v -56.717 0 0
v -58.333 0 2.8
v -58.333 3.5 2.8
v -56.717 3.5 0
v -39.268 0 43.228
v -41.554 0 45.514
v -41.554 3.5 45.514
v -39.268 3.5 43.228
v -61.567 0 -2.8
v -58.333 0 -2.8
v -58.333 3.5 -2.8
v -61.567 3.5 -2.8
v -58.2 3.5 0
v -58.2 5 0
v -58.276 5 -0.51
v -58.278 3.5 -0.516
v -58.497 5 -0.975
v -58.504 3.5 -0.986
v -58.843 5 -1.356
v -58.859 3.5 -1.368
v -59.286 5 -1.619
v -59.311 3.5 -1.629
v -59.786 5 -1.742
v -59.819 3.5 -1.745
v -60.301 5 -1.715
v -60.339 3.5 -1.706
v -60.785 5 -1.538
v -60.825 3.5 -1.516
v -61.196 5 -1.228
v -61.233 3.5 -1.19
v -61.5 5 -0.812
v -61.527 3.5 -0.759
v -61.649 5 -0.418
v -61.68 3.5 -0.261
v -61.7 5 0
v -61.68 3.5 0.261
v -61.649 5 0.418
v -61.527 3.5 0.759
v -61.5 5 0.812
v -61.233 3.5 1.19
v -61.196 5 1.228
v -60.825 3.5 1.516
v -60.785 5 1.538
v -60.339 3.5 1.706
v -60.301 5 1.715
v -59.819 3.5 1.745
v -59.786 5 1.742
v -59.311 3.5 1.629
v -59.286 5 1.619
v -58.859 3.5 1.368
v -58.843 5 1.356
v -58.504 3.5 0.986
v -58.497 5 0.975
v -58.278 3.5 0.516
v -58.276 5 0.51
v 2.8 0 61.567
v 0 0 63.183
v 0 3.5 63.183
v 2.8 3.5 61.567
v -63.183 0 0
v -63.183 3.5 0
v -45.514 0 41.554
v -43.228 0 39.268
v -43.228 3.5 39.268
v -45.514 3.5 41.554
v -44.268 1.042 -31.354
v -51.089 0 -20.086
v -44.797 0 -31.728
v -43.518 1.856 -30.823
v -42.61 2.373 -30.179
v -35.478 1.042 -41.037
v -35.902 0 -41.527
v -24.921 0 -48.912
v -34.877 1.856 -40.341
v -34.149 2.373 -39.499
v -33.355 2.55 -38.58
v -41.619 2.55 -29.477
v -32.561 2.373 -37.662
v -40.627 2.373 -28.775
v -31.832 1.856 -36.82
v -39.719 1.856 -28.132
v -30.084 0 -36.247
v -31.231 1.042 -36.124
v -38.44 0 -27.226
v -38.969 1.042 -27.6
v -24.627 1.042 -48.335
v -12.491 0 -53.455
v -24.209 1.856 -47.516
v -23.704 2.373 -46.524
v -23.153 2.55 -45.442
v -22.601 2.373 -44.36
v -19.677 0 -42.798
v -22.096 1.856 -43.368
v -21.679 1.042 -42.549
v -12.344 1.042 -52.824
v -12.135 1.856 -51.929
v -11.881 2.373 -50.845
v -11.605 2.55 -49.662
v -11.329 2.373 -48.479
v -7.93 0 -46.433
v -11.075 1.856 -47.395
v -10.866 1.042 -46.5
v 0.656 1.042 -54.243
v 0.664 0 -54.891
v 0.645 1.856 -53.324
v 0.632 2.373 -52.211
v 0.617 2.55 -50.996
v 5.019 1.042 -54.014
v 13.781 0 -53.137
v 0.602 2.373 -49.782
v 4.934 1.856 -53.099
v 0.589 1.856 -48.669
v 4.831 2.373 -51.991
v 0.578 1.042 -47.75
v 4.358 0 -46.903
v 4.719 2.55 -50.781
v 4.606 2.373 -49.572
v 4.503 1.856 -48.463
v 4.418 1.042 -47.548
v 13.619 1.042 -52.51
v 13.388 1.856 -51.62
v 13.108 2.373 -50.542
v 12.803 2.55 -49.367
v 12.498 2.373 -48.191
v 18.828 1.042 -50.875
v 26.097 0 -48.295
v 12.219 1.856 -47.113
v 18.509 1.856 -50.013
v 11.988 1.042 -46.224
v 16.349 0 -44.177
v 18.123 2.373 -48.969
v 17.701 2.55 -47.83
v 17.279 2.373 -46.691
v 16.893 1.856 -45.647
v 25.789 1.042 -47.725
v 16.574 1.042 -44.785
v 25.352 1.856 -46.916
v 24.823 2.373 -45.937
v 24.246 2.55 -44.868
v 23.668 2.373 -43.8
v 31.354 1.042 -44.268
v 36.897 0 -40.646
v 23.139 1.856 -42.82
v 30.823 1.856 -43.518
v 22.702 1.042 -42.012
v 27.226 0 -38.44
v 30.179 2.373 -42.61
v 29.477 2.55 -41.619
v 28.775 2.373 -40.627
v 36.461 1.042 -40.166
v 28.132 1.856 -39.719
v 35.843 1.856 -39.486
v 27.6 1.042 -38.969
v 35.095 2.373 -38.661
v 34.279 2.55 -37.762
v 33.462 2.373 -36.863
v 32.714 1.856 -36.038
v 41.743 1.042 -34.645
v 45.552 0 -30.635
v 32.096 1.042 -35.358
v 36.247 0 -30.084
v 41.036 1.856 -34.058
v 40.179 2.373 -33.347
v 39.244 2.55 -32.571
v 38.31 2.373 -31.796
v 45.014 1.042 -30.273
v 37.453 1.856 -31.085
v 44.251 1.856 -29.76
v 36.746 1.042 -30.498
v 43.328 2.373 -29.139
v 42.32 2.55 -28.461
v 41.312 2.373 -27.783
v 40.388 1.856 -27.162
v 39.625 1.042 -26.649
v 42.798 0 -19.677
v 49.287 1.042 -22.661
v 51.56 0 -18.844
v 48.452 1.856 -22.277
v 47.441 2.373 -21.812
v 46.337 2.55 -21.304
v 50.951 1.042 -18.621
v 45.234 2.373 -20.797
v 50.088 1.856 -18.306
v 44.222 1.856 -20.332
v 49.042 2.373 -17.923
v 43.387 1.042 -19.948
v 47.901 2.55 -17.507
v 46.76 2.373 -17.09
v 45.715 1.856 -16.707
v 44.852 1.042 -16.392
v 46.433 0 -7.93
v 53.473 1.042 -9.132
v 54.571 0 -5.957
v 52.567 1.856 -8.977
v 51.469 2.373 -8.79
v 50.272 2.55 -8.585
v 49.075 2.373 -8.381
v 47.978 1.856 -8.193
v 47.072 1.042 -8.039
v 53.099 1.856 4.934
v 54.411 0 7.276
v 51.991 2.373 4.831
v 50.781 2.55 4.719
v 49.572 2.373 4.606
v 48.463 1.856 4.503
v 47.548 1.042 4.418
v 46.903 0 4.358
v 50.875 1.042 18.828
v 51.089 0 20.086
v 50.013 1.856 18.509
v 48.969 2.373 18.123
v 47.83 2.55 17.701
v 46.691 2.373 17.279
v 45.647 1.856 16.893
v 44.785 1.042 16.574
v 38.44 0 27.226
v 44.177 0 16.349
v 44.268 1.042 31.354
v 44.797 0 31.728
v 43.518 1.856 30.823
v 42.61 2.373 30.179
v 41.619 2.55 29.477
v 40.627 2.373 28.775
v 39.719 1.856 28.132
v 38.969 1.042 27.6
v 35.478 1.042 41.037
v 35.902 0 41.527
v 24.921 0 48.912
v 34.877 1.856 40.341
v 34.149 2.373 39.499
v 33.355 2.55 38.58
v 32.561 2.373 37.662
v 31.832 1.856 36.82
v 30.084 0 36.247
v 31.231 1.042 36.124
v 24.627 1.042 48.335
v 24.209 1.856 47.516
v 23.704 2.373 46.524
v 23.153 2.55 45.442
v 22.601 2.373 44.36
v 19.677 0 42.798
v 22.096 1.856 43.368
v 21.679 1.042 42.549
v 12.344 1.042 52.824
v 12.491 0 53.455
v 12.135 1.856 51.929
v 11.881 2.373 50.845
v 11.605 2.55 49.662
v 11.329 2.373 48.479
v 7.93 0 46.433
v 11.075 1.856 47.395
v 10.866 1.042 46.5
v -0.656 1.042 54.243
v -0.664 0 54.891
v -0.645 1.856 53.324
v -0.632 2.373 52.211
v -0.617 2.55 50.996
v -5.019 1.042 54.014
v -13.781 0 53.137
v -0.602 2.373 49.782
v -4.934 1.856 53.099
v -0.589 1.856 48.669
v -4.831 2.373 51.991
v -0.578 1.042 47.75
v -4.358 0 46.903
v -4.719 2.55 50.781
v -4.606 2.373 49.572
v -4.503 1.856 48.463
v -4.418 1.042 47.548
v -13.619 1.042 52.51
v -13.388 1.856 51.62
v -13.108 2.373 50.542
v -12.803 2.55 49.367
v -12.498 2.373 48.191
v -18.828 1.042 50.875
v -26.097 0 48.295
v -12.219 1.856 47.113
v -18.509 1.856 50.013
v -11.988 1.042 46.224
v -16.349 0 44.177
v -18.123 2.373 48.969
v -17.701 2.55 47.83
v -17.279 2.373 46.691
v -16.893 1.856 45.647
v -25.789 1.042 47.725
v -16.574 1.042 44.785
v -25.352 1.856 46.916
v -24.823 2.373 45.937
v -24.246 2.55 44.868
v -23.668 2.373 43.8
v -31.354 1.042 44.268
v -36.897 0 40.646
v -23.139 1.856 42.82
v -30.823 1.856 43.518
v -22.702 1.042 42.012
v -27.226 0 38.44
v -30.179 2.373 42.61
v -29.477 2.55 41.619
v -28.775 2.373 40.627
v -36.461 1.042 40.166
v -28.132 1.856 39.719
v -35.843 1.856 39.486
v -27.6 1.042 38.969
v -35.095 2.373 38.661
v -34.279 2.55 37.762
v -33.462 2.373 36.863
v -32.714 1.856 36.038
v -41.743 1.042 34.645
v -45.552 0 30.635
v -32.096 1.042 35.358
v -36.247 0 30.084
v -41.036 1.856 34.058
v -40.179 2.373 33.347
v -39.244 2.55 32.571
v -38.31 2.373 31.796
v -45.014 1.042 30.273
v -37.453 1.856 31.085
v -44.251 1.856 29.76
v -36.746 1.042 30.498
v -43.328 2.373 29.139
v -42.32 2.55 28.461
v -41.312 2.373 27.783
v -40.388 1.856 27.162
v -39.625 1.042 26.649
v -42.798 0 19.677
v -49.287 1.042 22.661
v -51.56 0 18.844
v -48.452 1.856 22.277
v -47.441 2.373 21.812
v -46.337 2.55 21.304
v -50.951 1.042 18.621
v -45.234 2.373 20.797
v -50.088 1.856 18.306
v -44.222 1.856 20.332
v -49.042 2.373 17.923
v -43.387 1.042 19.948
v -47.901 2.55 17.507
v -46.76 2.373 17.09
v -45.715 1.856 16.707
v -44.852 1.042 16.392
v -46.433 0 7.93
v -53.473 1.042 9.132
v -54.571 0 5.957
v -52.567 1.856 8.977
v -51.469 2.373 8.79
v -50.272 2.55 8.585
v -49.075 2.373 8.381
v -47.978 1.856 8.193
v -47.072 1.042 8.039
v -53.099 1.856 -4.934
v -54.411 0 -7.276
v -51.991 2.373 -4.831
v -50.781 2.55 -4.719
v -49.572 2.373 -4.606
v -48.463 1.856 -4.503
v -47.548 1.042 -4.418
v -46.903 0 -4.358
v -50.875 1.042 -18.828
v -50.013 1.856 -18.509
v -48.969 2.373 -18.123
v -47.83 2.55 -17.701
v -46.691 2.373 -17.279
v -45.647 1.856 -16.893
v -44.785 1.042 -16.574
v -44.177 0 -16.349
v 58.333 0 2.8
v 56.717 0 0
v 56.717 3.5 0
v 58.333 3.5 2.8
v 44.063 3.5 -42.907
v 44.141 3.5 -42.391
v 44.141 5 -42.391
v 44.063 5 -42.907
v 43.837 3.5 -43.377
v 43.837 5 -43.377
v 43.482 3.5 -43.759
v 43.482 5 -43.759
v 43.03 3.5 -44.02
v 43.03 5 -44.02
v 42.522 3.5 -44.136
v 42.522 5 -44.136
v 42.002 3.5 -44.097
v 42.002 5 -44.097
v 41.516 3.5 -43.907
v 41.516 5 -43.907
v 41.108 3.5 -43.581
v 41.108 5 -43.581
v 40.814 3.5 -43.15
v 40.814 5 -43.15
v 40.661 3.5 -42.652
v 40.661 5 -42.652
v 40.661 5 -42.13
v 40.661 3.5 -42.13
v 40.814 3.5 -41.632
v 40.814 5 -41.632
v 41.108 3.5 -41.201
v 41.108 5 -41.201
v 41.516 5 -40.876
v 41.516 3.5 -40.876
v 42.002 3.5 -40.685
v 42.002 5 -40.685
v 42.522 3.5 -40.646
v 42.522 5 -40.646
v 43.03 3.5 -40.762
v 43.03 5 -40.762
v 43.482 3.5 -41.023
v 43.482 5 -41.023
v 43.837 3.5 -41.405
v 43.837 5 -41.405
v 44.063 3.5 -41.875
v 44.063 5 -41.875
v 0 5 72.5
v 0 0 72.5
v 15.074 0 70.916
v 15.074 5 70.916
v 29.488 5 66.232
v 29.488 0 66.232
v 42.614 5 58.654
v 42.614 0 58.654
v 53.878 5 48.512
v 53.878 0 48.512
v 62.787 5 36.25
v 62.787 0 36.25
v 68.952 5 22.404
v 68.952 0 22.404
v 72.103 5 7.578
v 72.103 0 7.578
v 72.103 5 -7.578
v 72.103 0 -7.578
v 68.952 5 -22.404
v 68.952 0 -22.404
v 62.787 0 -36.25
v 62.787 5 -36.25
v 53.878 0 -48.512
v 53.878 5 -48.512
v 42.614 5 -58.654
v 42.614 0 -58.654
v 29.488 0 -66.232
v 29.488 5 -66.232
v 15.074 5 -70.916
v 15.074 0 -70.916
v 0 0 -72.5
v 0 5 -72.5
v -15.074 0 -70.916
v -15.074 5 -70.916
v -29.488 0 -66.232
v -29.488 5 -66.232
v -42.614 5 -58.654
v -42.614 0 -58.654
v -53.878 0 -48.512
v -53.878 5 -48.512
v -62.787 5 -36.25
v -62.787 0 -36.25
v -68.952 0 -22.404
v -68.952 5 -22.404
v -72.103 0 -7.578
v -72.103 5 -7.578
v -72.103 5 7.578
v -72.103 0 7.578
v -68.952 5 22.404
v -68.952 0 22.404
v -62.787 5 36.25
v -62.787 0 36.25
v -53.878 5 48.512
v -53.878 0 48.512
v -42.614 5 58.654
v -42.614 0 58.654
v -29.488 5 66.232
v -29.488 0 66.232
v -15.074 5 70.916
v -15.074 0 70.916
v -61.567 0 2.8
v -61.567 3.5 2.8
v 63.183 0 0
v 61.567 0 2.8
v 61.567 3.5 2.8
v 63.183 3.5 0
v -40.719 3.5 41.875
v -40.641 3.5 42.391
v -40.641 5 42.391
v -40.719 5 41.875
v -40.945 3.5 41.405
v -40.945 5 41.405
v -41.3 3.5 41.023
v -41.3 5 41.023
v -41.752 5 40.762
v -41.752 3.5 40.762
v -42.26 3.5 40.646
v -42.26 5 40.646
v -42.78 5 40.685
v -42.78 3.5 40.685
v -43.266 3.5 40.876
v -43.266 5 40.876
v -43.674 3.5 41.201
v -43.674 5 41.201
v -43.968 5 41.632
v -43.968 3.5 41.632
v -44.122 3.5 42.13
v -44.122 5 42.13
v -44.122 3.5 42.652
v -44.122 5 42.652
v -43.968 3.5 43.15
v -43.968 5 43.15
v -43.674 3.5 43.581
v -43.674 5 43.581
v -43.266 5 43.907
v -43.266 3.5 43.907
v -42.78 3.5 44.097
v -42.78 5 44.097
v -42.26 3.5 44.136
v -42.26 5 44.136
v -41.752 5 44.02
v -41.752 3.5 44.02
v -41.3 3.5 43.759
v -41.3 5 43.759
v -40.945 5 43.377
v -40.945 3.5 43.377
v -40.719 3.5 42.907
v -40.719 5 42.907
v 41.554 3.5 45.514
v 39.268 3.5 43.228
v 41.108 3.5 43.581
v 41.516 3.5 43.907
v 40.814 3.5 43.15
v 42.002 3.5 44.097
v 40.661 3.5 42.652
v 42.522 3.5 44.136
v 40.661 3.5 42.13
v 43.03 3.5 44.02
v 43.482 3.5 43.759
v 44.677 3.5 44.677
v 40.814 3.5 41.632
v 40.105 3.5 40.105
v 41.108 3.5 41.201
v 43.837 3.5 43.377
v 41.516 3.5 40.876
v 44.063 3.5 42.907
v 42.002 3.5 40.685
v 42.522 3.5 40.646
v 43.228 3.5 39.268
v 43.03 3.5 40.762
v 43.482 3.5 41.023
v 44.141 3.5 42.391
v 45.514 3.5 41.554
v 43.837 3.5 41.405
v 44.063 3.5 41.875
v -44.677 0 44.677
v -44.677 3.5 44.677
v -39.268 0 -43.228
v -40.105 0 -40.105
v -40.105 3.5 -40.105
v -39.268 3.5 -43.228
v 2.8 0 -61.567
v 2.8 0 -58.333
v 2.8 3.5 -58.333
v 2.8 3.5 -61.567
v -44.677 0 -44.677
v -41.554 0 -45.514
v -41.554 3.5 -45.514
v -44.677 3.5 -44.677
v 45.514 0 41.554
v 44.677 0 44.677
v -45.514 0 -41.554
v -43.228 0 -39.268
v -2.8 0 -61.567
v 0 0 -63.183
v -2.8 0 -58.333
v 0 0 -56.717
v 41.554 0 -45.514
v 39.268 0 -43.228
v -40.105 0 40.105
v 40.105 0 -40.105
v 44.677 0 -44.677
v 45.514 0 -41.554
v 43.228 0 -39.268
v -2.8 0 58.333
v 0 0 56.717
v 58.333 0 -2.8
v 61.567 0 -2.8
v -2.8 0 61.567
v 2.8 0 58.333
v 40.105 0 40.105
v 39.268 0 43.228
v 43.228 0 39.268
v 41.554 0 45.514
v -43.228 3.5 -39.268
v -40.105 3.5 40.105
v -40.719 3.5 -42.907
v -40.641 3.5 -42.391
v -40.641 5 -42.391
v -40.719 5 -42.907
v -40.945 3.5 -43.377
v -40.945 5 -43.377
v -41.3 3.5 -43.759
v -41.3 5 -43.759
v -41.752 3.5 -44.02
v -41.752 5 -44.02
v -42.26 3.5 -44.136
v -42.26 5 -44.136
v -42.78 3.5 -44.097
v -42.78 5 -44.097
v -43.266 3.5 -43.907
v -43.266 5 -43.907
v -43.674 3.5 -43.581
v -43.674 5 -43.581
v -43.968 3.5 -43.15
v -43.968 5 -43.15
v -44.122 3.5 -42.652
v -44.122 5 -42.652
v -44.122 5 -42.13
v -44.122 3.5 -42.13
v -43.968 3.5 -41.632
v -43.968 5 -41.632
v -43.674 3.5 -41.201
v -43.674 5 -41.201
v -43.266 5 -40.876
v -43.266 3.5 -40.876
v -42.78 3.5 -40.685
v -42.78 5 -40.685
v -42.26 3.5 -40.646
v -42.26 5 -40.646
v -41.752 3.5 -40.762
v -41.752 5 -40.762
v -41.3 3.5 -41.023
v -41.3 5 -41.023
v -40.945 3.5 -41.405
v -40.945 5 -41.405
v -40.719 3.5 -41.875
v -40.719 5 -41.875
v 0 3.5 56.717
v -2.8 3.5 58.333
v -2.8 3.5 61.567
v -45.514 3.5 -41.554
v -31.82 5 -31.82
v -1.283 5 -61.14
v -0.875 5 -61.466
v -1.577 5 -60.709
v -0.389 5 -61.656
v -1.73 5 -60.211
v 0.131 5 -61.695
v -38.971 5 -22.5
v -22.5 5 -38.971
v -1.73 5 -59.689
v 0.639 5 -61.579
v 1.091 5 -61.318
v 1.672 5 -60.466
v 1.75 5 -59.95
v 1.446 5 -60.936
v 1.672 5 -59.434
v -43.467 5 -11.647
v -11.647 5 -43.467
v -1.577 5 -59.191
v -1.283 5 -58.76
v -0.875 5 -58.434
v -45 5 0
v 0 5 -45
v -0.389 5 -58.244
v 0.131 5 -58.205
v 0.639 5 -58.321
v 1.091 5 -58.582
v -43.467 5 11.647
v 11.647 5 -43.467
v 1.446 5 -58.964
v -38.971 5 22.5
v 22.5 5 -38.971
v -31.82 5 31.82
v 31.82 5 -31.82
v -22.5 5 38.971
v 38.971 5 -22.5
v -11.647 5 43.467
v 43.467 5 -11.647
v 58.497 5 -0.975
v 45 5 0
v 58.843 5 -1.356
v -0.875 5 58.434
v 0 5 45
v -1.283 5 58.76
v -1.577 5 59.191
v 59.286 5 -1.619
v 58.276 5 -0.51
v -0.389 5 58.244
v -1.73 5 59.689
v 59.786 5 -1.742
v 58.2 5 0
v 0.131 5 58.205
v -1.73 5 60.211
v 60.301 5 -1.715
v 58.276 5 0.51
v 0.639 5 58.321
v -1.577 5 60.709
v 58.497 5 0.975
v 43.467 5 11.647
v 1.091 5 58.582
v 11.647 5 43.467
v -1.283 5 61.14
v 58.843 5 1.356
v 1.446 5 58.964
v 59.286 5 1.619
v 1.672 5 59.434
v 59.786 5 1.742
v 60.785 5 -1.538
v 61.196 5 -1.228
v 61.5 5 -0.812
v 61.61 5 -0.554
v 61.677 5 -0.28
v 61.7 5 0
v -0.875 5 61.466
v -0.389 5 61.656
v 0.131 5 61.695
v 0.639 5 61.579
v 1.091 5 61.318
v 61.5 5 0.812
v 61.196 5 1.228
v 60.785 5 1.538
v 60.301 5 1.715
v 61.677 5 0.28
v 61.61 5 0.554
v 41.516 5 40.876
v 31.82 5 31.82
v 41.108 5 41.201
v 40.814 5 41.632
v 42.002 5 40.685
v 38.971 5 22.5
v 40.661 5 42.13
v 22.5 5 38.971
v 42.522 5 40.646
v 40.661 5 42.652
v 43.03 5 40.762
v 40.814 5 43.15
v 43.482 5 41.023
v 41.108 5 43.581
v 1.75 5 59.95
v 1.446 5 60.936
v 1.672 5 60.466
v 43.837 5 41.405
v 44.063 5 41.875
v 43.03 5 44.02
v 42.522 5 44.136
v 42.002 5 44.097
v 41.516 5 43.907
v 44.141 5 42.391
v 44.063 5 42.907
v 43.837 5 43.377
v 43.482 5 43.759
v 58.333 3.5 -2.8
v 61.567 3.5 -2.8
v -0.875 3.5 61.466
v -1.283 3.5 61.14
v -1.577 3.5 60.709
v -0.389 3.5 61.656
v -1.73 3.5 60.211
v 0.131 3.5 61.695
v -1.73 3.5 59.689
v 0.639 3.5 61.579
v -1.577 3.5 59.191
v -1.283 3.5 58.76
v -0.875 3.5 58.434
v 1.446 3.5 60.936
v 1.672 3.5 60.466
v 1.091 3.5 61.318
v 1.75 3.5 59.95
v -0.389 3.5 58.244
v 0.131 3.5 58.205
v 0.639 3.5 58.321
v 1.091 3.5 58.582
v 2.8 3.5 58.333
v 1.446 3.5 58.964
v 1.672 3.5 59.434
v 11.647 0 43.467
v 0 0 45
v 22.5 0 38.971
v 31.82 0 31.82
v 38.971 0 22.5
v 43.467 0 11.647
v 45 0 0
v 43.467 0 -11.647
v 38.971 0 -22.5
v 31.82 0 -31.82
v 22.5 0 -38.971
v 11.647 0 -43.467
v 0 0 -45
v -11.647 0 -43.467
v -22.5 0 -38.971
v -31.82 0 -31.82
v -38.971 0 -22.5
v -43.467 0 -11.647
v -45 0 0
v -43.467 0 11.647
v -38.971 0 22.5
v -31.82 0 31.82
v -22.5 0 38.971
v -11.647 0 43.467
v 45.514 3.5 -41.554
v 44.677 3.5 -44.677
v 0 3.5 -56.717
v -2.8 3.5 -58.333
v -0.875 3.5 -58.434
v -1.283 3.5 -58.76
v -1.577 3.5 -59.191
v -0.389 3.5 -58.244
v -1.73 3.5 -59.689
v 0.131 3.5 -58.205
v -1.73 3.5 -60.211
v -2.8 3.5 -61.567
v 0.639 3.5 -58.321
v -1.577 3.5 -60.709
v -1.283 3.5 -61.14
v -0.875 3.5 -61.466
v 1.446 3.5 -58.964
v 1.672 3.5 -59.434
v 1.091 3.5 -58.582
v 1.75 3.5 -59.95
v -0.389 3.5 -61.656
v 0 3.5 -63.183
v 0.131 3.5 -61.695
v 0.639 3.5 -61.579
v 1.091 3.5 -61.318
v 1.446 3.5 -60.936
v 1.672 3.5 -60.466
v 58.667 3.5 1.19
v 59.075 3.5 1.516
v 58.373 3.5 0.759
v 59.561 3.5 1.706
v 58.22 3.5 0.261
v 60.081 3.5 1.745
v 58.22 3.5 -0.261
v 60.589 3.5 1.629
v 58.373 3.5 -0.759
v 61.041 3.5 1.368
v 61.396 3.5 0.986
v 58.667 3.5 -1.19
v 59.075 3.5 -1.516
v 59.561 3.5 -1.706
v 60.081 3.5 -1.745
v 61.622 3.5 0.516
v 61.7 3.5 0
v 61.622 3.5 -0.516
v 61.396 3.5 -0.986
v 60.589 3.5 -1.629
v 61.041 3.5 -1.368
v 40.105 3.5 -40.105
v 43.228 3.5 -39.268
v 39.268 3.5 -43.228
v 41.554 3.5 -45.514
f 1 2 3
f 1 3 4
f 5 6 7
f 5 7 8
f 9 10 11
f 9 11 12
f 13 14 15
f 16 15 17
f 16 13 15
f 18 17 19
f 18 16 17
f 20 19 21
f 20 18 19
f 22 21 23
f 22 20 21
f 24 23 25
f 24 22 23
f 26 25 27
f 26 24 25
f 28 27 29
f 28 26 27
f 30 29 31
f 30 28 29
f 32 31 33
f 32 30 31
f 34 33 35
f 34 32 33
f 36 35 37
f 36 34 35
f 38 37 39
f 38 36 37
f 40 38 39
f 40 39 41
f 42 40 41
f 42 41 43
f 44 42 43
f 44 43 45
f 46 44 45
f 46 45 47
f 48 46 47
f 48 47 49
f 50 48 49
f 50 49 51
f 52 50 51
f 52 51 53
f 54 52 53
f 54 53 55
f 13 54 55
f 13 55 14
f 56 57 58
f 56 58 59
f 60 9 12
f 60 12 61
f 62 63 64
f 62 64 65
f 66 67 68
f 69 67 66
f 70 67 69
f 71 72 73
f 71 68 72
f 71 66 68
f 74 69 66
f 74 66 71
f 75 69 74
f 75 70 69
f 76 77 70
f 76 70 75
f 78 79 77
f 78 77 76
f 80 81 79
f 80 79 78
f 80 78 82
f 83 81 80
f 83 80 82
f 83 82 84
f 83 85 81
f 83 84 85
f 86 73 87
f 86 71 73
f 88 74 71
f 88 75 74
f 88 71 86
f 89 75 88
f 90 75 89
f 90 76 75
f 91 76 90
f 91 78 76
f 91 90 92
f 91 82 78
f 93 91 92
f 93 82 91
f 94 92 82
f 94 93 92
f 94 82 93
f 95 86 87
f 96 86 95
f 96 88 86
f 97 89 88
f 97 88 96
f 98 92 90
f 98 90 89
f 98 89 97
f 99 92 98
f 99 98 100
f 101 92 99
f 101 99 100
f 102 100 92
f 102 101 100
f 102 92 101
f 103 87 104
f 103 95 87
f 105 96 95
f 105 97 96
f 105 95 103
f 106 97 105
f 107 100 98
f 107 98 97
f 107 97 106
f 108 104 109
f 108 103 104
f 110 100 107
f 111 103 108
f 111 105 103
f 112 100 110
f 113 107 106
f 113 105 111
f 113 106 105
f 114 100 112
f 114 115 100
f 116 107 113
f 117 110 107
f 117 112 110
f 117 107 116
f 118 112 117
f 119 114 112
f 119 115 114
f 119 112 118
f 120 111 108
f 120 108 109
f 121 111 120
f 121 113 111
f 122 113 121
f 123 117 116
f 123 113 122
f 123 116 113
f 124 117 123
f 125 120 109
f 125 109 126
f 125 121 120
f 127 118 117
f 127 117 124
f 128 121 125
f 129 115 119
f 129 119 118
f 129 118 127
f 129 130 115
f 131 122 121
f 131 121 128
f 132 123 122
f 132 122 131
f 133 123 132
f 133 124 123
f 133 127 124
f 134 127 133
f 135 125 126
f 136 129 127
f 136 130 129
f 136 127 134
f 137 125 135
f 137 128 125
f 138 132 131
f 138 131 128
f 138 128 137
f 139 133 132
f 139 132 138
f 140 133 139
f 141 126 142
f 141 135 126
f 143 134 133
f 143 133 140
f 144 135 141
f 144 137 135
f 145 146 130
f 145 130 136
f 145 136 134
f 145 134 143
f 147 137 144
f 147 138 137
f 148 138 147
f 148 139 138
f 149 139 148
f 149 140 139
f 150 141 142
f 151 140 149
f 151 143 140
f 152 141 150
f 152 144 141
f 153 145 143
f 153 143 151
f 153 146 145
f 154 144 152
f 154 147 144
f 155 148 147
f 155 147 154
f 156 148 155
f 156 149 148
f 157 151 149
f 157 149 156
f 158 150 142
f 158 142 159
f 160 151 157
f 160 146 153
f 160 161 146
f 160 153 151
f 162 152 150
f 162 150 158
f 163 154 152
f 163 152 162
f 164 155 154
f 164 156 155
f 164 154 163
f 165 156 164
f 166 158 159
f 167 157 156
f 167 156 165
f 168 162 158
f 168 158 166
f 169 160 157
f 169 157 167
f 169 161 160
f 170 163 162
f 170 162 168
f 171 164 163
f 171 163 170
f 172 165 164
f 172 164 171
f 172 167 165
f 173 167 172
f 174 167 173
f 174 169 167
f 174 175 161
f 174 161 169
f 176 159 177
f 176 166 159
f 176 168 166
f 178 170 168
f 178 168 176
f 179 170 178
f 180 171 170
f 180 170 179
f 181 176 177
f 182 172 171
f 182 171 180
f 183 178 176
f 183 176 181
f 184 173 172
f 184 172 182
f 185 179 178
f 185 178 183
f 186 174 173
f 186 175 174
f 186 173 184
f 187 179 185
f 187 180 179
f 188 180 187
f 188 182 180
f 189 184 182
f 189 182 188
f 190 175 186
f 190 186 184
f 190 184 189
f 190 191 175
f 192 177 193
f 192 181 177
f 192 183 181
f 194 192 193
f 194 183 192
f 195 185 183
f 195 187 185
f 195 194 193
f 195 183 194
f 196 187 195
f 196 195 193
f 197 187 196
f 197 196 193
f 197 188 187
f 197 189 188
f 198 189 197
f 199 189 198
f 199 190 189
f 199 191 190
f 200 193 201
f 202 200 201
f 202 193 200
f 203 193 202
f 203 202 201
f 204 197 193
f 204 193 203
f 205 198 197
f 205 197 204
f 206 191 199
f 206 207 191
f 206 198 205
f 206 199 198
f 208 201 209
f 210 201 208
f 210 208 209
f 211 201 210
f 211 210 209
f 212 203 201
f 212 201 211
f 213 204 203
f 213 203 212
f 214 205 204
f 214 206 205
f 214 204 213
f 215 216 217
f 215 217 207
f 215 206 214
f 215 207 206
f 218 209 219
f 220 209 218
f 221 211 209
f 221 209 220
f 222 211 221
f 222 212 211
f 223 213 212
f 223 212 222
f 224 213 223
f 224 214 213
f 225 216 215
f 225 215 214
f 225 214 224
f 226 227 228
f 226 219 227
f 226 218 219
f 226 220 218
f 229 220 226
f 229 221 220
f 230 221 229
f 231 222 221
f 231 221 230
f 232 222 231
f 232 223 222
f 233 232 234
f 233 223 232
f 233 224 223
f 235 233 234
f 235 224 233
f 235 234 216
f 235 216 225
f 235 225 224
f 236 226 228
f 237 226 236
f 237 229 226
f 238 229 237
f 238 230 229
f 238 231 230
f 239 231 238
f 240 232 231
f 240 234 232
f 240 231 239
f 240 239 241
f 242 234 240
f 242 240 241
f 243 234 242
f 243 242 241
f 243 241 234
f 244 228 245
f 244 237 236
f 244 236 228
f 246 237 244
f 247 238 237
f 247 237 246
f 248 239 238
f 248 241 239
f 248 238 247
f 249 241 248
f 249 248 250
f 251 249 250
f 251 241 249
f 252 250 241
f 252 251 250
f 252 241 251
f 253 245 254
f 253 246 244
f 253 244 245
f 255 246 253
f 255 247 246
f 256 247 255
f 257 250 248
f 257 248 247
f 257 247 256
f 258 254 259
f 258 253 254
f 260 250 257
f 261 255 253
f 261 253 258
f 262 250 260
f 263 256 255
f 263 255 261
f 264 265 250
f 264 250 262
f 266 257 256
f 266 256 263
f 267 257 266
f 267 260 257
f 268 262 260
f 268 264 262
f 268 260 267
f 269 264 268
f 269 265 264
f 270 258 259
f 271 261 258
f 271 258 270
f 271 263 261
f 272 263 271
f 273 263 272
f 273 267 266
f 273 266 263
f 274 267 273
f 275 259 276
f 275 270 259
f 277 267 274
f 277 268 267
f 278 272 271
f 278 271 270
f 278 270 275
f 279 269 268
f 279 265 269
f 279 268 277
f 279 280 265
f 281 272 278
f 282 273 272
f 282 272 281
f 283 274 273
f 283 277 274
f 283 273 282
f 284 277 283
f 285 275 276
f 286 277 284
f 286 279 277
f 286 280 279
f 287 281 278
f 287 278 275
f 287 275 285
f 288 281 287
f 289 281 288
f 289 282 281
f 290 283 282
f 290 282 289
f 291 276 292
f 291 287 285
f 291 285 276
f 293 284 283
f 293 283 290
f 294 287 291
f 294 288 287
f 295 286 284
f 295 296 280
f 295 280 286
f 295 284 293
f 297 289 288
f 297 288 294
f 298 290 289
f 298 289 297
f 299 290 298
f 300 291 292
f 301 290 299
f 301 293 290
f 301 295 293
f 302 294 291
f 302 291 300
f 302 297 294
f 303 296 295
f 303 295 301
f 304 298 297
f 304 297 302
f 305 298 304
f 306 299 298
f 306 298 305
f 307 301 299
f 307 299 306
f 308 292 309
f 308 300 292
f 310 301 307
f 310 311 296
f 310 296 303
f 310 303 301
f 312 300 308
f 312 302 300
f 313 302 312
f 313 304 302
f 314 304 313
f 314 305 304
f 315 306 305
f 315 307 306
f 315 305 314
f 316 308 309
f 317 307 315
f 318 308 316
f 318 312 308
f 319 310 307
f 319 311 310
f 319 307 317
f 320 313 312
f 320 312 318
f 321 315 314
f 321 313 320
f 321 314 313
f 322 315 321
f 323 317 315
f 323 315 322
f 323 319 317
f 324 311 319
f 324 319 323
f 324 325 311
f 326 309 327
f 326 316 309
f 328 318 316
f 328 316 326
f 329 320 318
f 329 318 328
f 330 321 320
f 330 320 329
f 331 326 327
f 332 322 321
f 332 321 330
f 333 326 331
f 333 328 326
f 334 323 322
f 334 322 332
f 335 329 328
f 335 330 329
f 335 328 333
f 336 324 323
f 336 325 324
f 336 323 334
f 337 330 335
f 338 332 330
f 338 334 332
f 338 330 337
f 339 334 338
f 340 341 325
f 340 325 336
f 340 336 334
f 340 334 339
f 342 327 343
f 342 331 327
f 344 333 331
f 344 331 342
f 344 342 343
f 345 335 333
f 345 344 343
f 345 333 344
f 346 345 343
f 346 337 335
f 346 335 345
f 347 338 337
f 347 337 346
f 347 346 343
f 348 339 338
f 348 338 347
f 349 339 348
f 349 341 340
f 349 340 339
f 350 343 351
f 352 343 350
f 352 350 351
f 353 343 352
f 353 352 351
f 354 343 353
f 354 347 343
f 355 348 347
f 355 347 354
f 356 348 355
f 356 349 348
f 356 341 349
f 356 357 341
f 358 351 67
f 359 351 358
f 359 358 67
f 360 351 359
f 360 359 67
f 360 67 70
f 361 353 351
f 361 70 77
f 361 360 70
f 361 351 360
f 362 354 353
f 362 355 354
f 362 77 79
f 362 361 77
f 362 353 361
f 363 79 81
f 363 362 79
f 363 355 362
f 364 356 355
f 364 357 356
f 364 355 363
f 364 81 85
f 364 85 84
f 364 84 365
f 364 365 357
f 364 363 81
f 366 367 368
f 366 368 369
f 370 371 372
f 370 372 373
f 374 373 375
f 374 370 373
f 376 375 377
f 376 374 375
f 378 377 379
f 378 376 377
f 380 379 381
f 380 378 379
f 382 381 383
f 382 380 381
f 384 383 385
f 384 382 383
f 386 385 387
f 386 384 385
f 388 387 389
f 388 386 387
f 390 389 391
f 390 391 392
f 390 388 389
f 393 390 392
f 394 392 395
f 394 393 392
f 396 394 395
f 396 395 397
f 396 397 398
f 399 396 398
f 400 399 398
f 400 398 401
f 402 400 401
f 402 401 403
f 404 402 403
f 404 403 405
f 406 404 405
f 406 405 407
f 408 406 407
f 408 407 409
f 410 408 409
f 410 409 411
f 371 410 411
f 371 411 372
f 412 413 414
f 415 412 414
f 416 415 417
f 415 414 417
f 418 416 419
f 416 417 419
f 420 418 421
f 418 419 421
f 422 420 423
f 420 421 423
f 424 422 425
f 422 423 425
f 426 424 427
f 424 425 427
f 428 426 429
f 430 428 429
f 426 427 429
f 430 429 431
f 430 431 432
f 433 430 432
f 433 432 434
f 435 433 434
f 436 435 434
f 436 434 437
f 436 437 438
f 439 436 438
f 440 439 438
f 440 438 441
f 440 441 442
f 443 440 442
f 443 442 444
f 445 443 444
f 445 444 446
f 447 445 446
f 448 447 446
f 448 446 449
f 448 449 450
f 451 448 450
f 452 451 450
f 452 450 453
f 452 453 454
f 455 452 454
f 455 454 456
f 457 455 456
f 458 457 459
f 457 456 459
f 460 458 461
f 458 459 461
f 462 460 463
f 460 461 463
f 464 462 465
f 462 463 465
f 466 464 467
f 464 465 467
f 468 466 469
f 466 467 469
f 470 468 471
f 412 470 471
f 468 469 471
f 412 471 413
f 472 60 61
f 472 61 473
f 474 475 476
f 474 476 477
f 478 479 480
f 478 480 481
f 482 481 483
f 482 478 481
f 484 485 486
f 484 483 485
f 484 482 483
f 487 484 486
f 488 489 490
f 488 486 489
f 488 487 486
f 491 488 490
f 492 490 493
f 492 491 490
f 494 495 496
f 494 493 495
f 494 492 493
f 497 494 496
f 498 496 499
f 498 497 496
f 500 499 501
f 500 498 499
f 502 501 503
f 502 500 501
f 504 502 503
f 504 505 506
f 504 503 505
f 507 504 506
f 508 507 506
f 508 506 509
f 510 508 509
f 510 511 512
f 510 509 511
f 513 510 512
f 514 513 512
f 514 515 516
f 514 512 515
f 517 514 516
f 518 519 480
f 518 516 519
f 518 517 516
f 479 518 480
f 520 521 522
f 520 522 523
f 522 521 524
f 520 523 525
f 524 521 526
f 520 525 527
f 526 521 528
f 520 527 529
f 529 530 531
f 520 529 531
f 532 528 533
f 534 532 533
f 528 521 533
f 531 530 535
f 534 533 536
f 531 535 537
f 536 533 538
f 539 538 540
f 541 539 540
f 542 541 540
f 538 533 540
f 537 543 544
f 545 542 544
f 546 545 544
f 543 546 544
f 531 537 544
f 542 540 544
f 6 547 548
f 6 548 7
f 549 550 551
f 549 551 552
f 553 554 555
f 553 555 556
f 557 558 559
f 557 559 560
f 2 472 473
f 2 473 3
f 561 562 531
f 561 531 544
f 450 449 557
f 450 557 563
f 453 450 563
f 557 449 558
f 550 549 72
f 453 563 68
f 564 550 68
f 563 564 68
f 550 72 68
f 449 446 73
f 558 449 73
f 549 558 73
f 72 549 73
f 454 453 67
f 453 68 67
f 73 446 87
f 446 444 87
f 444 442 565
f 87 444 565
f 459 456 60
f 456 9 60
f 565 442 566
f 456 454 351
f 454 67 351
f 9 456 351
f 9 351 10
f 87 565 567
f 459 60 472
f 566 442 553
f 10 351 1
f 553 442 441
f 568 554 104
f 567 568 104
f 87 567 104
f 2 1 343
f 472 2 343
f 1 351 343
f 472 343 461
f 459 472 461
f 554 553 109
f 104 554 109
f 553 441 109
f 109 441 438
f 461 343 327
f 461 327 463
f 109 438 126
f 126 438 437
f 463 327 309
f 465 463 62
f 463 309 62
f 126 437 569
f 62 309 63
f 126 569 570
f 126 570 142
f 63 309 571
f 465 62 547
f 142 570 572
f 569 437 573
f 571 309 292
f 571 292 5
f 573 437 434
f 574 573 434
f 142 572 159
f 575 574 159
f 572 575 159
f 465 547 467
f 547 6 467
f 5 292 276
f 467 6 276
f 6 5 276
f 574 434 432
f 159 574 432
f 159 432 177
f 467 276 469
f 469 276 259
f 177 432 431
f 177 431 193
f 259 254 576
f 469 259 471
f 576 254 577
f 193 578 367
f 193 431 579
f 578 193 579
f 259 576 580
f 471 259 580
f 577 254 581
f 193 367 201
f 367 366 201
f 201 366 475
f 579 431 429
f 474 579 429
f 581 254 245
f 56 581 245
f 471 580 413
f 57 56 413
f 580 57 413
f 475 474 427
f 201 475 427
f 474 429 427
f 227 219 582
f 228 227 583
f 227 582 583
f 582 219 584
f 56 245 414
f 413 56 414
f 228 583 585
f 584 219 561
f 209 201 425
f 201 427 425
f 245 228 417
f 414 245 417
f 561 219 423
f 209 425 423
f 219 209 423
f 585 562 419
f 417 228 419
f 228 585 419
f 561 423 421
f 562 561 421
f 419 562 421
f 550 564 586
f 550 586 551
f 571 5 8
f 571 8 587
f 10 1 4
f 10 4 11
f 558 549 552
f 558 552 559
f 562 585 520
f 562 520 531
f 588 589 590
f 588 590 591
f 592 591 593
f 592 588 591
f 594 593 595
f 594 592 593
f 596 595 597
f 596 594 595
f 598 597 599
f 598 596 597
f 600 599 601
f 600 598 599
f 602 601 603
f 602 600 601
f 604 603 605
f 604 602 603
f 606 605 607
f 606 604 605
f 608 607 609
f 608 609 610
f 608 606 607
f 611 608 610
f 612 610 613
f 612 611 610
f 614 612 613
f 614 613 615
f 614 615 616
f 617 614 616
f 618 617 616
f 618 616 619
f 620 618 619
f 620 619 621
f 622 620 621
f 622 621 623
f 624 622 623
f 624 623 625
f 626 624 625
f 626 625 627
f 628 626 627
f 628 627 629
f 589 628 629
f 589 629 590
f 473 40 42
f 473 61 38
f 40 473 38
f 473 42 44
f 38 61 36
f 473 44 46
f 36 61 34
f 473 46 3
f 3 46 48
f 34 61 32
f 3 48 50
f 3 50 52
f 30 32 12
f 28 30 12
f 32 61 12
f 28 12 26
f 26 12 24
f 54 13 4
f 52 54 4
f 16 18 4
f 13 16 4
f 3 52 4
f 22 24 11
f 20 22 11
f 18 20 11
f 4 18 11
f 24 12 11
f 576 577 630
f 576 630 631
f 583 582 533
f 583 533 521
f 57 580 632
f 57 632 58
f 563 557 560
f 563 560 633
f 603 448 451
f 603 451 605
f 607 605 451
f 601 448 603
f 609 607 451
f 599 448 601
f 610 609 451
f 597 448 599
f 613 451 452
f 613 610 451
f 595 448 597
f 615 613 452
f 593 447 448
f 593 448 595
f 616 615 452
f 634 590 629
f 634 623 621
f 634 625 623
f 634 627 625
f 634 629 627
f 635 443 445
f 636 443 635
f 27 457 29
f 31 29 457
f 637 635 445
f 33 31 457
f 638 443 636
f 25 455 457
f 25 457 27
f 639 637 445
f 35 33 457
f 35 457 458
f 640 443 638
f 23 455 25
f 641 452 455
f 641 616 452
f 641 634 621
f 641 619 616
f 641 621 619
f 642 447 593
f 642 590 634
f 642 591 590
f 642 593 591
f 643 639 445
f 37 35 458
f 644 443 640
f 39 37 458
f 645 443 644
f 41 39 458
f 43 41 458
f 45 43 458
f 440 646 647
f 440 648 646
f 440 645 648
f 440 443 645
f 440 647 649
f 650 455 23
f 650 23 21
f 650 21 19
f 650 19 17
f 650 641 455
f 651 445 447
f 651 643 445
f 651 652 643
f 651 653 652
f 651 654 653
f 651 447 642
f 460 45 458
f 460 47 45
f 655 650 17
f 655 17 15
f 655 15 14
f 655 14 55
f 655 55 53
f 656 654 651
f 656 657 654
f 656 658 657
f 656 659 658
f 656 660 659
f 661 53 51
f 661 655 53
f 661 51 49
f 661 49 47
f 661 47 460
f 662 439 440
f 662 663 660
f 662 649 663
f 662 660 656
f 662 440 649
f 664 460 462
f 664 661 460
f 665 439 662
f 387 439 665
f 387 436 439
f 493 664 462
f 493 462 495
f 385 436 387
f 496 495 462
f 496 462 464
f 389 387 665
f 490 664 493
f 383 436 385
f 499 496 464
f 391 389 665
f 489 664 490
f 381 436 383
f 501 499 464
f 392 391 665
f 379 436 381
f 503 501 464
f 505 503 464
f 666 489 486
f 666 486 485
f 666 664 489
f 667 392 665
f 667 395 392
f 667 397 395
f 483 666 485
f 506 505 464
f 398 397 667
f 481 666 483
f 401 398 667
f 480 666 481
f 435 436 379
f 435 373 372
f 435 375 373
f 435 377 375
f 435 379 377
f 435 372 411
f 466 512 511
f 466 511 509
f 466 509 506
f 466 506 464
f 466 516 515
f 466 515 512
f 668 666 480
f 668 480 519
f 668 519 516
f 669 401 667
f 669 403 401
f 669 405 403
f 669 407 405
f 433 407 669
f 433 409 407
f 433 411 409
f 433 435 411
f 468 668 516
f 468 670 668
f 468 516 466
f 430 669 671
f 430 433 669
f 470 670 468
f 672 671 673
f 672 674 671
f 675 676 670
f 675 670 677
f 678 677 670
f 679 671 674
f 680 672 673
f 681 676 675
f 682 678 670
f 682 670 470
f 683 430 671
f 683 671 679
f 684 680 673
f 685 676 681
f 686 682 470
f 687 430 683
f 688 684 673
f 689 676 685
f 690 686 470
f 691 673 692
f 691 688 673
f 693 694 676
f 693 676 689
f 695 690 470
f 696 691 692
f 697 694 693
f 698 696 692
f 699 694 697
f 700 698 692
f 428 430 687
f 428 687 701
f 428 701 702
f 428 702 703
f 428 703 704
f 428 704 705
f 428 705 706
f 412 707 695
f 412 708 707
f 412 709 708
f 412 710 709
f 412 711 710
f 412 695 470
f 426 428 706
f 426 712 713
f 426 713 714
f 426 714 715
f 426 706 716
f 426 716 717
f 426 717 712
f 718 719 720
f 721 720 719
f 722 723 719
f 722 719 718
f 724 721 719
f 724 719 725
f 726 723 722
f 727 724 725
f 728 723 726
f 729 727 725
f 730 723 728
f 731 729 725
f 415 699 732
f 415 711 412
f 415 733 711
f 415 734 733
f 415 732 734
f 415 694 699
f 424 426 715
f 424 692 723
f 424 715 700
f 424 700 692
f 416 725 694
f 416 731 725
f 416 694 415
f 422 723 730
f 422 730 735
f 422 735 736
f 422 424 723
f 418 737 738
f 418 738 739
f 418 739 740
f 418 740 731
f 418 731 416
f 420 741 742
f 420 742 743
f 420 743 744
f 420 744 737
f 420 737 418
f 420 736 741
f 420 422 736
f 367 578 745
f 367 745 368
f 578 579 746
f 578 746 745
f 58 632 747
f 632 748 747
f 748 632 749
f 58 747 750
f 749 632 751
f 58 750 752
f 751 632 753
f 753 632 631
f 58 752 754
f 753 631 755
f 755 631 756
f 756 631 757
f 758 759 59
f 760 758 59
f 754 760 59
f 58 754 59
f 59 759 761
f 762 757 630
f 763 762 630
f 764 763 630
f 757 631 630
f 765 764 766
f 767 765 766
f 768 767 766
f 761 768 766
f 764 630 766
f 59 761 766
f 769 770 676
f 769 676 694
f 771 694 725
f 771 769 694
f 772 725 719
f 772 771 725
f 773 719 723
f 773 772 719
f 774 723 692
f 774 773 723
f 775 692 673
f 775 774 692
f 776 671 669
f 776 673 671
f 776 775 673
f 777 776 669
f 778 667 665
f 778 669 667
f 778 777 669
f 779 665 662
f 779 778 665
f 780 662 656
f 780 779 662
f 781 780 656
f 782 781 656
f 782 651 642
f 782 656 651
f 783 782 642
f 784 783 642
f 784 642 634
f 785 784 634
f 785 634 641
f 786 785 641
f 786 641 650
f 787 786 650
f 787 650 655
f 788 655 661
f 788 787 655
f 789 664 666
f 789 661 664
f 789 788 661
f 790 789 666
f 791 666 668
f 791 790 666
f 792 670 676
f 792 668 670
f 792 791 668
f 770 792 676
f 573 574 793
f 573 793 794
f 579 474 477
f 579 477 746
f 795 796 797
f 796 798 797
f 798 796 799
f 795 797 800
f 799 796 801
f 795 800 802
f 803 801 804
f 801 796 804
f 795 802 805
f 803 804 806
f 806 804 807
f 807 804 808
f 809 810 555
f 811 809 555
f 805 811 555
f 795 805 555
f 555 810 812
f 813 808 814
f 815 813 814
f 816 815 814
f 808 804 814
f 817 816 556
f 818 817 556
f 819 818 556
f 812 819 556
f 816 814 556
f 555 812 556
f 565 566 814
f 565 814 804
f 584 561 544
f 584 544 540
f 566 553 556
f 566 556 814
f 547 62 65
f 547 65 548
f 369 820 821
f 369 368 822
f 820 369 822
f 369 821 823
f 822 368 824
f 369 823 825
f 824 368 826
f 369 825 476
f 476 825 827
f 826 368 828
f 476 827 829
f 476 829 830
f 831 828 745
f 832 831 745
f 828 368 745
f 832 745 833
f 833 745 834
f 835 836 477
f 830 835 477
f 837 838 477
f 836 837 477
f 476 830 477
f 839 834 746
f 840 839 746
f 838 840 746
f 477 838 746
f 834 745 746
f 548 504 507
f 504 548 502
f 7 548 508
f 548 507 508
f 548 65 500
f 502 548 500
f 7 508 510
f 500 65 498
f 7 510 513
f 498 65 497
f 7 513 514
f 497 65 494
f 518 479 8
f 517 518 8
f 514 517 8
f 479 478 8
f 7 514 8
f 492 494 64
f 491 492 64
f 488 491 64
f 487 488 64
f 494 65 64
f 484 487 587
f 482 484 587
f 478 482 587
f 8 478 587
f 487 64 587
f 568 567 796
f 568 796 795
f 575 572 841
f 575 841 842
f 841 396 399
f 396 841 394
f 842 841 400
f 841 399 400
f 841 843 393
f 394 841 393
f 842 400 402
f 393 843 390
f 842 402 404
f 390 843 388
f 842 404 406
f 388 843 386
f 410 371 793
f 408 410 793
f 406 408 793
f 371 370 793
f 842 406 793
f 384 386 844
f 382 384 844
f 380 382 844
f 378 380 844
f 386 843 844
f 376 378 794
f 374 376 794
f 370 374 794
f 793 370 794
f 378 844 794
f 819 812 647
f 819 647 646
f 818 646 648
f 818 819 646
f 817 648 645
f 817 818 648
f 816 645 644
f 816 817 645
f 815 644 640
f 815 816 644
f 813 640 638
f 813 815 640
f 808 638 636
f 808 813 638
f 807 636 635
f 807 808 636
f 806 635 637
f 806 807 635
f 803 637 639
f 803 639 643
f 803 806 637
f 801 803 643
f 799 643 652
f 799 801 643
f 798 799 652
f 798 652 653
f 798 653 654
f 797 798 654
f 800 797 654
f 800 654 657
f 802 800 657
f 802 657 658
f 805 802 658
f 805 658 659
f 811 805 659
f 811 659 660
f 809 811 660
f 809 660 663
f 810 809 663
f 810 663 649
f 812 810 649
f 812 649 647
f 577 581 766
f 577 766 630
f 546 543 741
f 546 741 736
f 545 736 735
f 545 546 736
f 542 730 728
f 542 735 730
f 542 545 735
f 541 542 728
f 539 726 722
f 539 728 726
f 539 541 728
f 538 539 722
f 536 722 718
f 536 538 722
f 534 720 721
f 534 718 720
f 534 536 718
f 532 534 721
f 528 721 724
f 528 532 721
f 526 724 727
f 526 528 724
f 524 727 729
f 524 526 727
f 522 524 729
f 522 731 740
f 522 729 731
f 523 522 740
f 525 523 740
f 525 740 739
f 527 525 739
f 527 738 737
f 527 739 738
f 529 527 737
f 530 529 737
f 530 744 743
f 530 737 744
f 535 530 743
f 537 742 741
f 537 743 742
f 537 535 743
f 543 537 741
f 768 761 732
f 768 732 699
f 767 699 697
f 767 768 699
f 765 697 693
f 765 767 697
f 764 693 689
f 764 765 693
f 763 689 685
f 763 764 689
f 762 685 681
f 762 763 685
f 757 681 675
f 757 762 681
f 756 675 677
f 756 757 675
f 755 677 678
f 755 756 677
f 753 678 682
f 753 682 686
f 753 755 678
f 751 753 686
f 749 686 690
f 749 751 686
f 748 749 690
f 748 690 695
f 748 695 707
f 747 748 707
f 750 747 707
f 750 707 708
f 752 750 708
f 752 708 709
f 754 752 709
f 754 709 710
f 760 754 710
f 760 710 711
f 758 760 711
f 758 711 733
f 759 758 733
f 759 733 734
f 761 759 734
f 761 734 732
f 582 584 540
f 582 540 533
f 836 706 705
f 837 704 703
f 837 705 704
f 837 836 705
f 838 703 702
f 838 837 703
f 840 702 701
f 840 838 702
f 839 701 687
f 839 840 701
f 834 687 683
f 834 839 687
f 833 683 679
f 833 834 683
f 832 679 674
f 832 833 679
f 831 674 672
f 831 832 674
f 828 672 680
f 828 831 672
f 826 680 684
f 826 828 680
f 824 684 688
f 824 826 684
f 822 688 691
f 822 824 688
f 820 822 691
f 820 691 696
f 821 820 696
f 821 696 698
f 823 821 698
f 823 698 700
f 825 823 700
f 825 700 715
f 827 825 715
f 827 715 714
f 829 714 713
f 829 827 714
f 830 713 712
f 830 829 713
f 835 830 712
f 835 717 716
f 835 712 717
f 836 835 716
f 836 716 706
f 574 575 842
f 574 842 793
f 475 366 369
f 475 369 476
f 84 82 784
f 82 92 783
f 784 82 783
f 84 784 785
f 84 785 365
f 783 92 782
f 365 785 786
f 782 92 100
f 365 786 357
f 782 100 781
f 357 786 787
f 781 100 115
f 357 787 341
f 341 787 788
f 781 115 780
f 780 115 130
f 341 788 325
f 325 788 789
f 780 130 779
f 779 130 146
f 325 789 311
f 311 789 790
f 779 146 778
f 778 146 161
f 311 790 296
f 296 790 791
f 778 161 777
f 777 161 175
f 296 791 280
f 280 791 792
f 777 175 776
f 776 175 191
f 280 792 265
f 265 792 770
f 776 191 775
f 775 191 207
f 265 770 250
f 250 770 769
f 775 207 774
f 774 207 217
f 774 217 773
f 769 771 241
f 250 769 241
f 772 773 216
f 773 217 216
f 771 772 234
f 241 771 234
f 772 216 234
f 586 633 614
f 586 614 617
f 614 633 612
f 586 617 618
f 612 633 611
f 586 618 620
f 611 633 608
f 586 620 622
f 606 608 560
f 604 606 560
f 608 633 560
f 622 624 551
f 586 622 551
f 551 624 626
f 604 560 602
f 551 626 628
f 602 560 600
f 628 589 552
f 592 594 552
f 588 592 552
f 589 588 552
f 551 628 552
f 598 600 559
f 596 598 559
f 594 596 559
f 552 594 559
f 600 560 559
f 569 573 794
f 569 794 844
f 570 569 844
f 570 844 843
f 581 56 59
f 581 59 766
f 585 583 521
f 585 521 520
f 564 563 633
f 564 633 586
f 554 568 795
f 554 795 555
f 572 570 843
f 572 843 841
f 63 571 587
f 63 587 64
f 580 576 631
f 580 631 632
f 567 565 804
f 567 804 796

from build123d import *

# Parameters (mm, degrees)
SZKIC1_R                         = 72.5
DODANIE_WYCI_GNI_CIE1_DEPTH      = 5
DODANIE_WYCI_GNI_CIE2_START      = 5
SZKIC1_3_R                       = 65
SZKIC1_3_R_2                     = 54.5
DODANIE_WYCI_GNI_CIE2_DEPTH      = 8
DODANIE_WYCI_GNI_CIE3_START      = 13
SZKIC1_4_R                       = 54.5
DODANIE_WYCI_GNI_CIE3_DEPTH      = 30
DODANIE_WYCI_GNI_CIE4_START      = 43
SZKIC2_W                         = 34
SZKIC2_H                         = 88
DODANIE_WYCI_GNI_CIE4_DEPTH      = 93
SZKIC3_R                         = 45
WYTNIJ_WYCI_GNI_CIE1_DEPTH       = 10
DODANIE_WYCI_GNI_CIE5_START      = 10
SZKIC4_R                         = 3
DODANIE_WYCI_GNI_CIE5_DEPTH      = 13
ZAAWANSOWANYOTW_R1_OUTLINE_R     = 1.75
ZAAWANSOWANYOTW_R1_DEPTH         = 13
ZAAWANSOWANYOTW_R1_START         = 10
ZAAWANSOWANYOTW_R1_2_OUTLINE_R   = 3
ZAAWANSOWANYOTW_R1_2_OUTLINE_R_2 = 1.75
ZAAWANSOWANYOTW_R1_2_DEPTH       = 3
SZKIC7_R                         = 4.25
WYTNIJ_WYCI_GNI_CIE2_START       = -13
WYTNIJ_WYCI_GNI_CIE2_DEPTH       = 3.5
PRZECI_CIE1_START                = 5
PRZECI_CIE1_OUTLINE_R            = 1.75
PRZECI_CIE1_DEPTH                = 131
PRZECI_CIE1_START_2              = -3
PRZECI_CIE1_2_OUTLINE_R          = 3
PRZECI_CIE1_2_DEPTH              = 8


# Read off the part's stored shape, not the designer's step: ZaawansowanyOtwór1, Przecięcie1
with BuildPart() as part:
    # Szkic1 → Dodanie-wyciągnięcie1 (new body)
    with BuildSketch(Plane(origin=(0, 0, 0), x_dir=(1, 0, 0), z_dir=(0, 1, 0))):
        with Locations(Location((0, 0, 0), (0, 0, 270))):
            Circle(SZKIC1_R)
    extrude(amount=DODANIE_WYCI_GNI_CIE1_DEPTH)

    # Szkic1<3> → Dodanie-wyciągnięcie2 (add)
    with BuildSketch(Plane(origin=(0, 0, 0), x_dir=(1, 0, 0), z_dir=(0, 1, 0)).offset(DODANIE_WYCI_GNI_CIE2_START)):
        with Locations(Location((0, 0, 0), (0, 0, 270))):
            Circle(SZKIC1_3_R)
        Circle(SZKIC1_3_R_2)
    extrude(amount=DODANIE_WYCI_GNI_CIE2_DEPTH)

    # Szkic1<4> → Dodanie-wyciągnięcie3 (add)
    with BuildSketch(Plane(origin=(0, 0, 0), x_dir=(1, 0, 0), z_dir=(0, 1, 0)).offset(DODANIE_WYCI_GNI_CIE3_START)):
        with Locations(Location((0, 0, 0), (0, 0, 270))):
            Circle(SZKIC1_4_R)
    extrude(amount=DODANIE_WYCI_GNI_CIE3_DEPTH)

    # Szkic2 → Dodanie-wyciągnięcie4 (add)
    with BuildSketch(Plane(origin=(0, 0, 0), x_dir=(1, 0, 0), z_dir=(0, 1, 0)).offset(DODANIE_WYCI_GNI_CIE4_START)):
        with Locations((-44.5, -12.5)):
            Rectangle(SZKIC2_W, SZKIC2_H)
        with Locations((44.5, -12.5)):
            Rectangle(SZKIC2_W, SZKIC2_H)
    extrude(amount=DODANIE_WYCI_GNI_CIE4_DEPTH)

    # Szkic3 → Wytnij-wyciągnięcie1 (cut)
    with BuildSketch(Plane(origin=(0, 0, 0), x_dir=(1, 0, 0), z_dir=(0, 1, 0))):
        with Locations(Location((0, 0, 0), (0, 0, 270))):
            Circle(SZKIC3_R)
    extrude(amount=WYTNIJ_WYCI_GNI_CIE1_DEPTH, mode=Mode.SUBTRACT)

    # Szkic4 → Dodanie-wyciągnięcie5 (add)
    with BuildSketch(Plane(origin=(0, 0, 0), x_dir=(1, 0, 0), z_dir=(0, 1, 0)).offset(DODANIE_WYCI_GNI_CIE5_START)):
        with Locations(Location((0, 0, 0), (0, 0, 270))):
            Circle(SZKIC4_R)
    extrude(amount=-DODANIE_WYCI_GNI_CIE5_DEPTH)

    # ZaawansowanyOtwór1 outline → ZaawansowanyOtwór1 (cut)
    with BuildSketch(Plane(origin=(0, 0, 0), x_dir=(1, 0, 0), z_dir=(0, 1, 0))):
        with Locations((-42.391051532, 42.391051532)):
            Circle(ZAAWANSOWANYOTW_R1_OUTLINE_R)
        with Locations((-59.95, 0)):
            Circle(ZAAWANSOWANYOTW_R1_OUTLINE_R)
        with Locations((-42.391051532, -42.391051532)):
            Circle(ZAAWANSOWANYOTW_R1_OUTLINE_R)
        with Locations((0, -59.95)):
            Circle(ZAAWANSOWANYOTW_R1_OUTLINE_R)
        with Locations((42.391051532, -42.391051532)):
            Circle(ZAAWANSOWANYOTW_R1_OUTLINE_R)
        with Locations((59.95, 0)):
            Circle(ZAAWANSOWANYOTW_R1_OUTLINE_R)
        with Locations((42.391051532, 42.391051532)):
            Circle(ZAAWANSOWANYOTW_R1_OUTLINE_R)
        with Locations((0, 59.95)):
            Circle(ZAAWANSOWANYOTW_R1_OUTLINE_R)
    extrude(amount=ZAAWANSOWANYOTW_R1_DEPTH, mode=Mode.SUBTRACT)

    # ZaawansowanyOtw_r1 2 outline → ZaawansowanyOtw_r1 2 (cut)
    # profile 1 of 8: a face of its own
    with BuildSketch(Plane(origin=(0, 0, 0), x_dir=(1, 0, 0), z_dir=(0, 1, 0)).offset(ZAAWANSOWANYOTW_R1_START)):
        with Locations((-42.391051532, 42.391051532)):
            Circle(ZAAWANSOWANYOTW_R1_2_OUTLINE_R)
        with Locations((-42.391051532, 42.391051532)):
            Circle(ZAAWANSOWANYOTW_R1_2_OUTLINE_R_2, mode=Mode.SUBTRACT)
    # profile 2 of 8: a face of its own
    with BuildSketch(Plane(origin=(0, 0, 0), x_dir=(1, 0, 0), z_dir=(0, 1, 0)).offset(ZAAWANSOWANYOTW_R1_START)):
        with Locations((-59.95, 0)):
            Circle(ZAAWANSOWANYOTW_R1_2_OUTLINE_R)
        with Locations((-59.95, 0)):
            Circle(ZAAWANSOWANYOTW_R1_2_OUTLINE_R_2, mode=Mode.SUBTRACT)
    # profile 3 of 8: a face of its own
    with BuildSketch(Plane(origin=(0, 0, 0), x_dir=(1, 0, 0), z_dir=(0, 1, 0)).offset(ZAAWANSOWANYOTW_R1_START)):
        with Locations((-42.391051532, -42.391051532)):
            Circle(ZAAWANSOWANYOTW_R1_2_OUTLINE_R)
        with Locations((-42.391051532, -42.391051532)):
            Circle(ZAAWANSOWANYOTW_R1_2_OUTLINE_R_2, mode=Mode.SUBTRACT)
    # profile 4 of 8: a face of its own
    with BuildSketch(Plane(origin=(0, 0, 0), x_dir=(1, 0, 0), z_dir=(0, 1, 0)).offset(ZAAWANSOWANYOTW_R1_START)):
        with Locations((0, -59.95)):
            Circle(ZAAWANSOWANYOTW_R1_2_OUTLINE_R)
        with Locations((0, -59.95)):
            Circle(ZAAWANSOWANYOTW_R1_2_OUTLINE_R_2, mode=Mode.SUBTRACT)
    # profile 5 of 8: a face of its own
    with BuildSketch(Plane(origin=(0, 0, 0), x_dir=(1, 0, 0), z_dir=(0, 1, 0)).offset(ZAAWANSOWANYOTW_R1_START)):
        with Locations((42.391051532, -42.391051532)):
            Circle(ZAAWANSOWANYOTW_R1_2_OUTLINE_R)
        with Locations((42.391051532, -42.391051532)):
            Circle(ZAAWANSOWANYOTW_R1_2_OUTLINE_R_2, mode=Mode.SUBTRACT)
    # profile 6 of 8: a face of its own
    with BuildSketch(Plane(origin=(0, 0, 0), x_dir=(1, 0, 0), z_dir=(0, 1, 0)).offset(ZAAWANSOWANYOTW_R1_START)):
        with Locations((59.95, 0)):
            Circle(ZAAWANSOWANYOTW_R1_2_OUTLINE_R)
        with Locations((59.95, 0)):
            Circle(ZAAWANSOWANYOTW_R1_2_OUTLINE_R_2, mode=Mode.SUBTRACT)
    # profile 7 of 8: a face of its own
    with BuildSketch(Plane(origin=(0, 0, 0), x_dir=(1, 0, 0), z_dir=(0, 1, 0)).offset(ZAAWANSOWANYOTW_R1_START)):
        with Locations((42.391051532, 42.391051532)):
            Circle(ZAAWANSOWANYOTW_R1_2_OUTLINE_R)
        with Locations((42.391051532, 42.391051532)):
            Circle(ZAAWANSOWANYOTW_R1_2_OUTLINE_R_2, mode=Mode.SUBTRACT)
    # profile 8 of 8: a face of its own
    with BuildSketch(Plane(origin=(0, 0, 0), x_dir=(1, 0, 0), z_dir=(0, 1, 0)).offset(ZAAWANSOWANYOTW_R1_START)):
        with Locations((0, 59.95)):
            Circle(ZAAWANSOWANYOTW_R1_2_OUTLINE_R)
        with Locations((0, 59.95)):
            Circle(ZAAWANSOWANYOTW_R1_2_OUTLINE_R_2, mode=Mode.SUBTRACT)
    extrude(amount=ZAAWANSOWANYOTW_R1_2_DEPTH, mode=Mode.SUBTRACT)

    # Szkic7 → Wycięcie-obrót1 (revolve, cut)
    with BuildSketch(Plane(origin=(0, 0, 0), x_dir=(0, 0, -1), z_dir=(1, 0, 0)), mode=Mode.PRIVATE) as wyci_cie_obr_t1_sk:
        with Locations((51, -1.7)):
            Circle(SZKIC7_R)
    revolve(wyci_cie_obr_t1_sk.sketch.rotate(Axis((0, 0, 0), (0, -1, 0)), 305.308707607), axis=Axis((0, 0, 0), (0, -1, 0)), mode=Mode.SUBTRACT)

    # Szkic5 → Wytnij-wyciągnięcie2 (cut)
    with BuildSketch(Plane(origin=(0, 13, 0), x_dir=(1, 0, 0), z_dir=(0, 1, 0)).offset(WYTNIJ_WYCI_GNI_CIE2_START)):
        Polygon((43.227855306, 39.268057332), (45.514045733, 41.554247758), (44.677241959, 44.677241959), (41.554247758, 45.514045733), (39.268057332, 43.227855306), (40.104861106, 40.104861106), align=None)
        Polygon((-2.8, 61.566580754), (-2.8, 58.333419246), (0, 56.716838493), (2.8, 58.333419246), (2.8, 61.566580754), (0, 63.183161507), align=None)
        Polygon((58.333419246, -2.8), (61.566580754, -2.8), (63.183161507, 0), (61.566580754, 2.8), (58.333419246, 2.8), (56.716838493, 0), align=None)
        Polygon((39.268057332, -43.227855306), (41.554247758, -45.514045733), (44.677241959, -44.677241959), (45.514045733, -41.554247758), (43.227855306, -39.268057332), (40.104861106, -40.104861106), align=None)
        Polygon((-2.8, -58.333419246), (-2.8, -61.566580754), (0, -63.183161507), (2.8, -61.566580754), (2.8, -58.333419246), (0, -56.716838493), align=None)
        Polygon((-43.227855306, -39.268057332), (-45.514045733, -41.554247758), (-44.677241959, -44.677241959), (-41.554247758, -45.514045733), (-39.268057332, -43.227855306), (-40.104861106, -40.104861106), align=None)
        Polygon((-58.333419246, 2.8), (-61.566580754, 2.8), (-63.183161507, 0), (-61.566580754, -2.8), (-58.333419246, -2.8), (-56.716838493, 0), align=None)
        Polygon((-39.268057332, 43.227855306), (-41.554247758, 45.514045733), (-44.677241959, 44.677241959), (-45.514045733, 41.554247758), (-43.227855306, 39.268057332), (-40.104861106, 40.104861106), align=None)
    extrude(amount=WYTNIJ_WYCI_GNI_CIE2_DEPTH, mode=Mode.SUBTRACT)

    # Przecięcie1 outline → Przecięcie1 (cut)
    with BuildSketch(Plane(origin=(0, 0, 0), x_dir=(1, 0, 0), z_dir=(0, 1, 0)).offset(PRZECI_CIE1_START)):
        with BuildLine():
            ThreePointArc((61.5, -21.041625412), (65, 0), (61.5, 21.041625413))
            Line((61.5, 21.041625413), (61.5, 31.5))
            Line((61.5, 31.5), (56.857277459, 31.5))
            ThreePointArc((56.857277459, 31.5), (0, 65), (-56.857277459, 31.5))
            Line((-56.857277459, 31.5), (-61.5, 31.5))
            Line((-61.5, 31.5), (-61.5, 21.041625412))
            ThreePointArc((-61.5, 21.041625412), (-65, 0), (-61.5, -21.041625412))
            Line((-61.5, -21.041625412), (-61.5, -56.5))
            Line((-61.5, -56.5), (-32.136427928, -56.5))
            ThreePointArc((-32.136427928, -56.5), (0, -65), (32.136427928, -56.5))
            Line((32.136427928, -56.5), (61.5, -56.5))
            Line((61.5, -56.5), (61.5, -21.041625412))
        make_face()
        with BuildLine():
            ThreePointArc((61.5, 0.81240384), (61.7, 0), (61.5, -0.81240384))
            Line((61.5, -0.81240384), (61.5, 0.81240384))
        make_face(mode=Mode.SUBTRACT)
        with Locations((0, -59.95)):
            Circle(PRZECI_CIE1_OUTLINE_R, mode=Mode.SUBTRACT)
        with Locations((42.391051532, 42.391051532)):
            Circle(PRZECI_CIE1_OUTLINE_R, mode=Mode.SUBTRACT)
        with Locations((-42.391051532, 42.391051532)):
            Circle(PRZECI_CIE1_OUTLINE_R, mode=Mode.SUBTRACT)
        with Locations((0, 59.95)):
            Circle(PRZECI_CIE1_OUTLINE_R, mode=Mode.SUBTRACT)
        with BuildLine():
            ThreePointArc((-61.5, -0.81240384), (-61.7, 0), (-61.5, 0.81240384))
            Line((-61.5, 0.81240384), (-61.5, -0.81240384))
        make_face(mode=Mode.SUBTRACT)
    extrude(amount=PRZECI_CIE1_DEPTH, mode=Mode.SUBTRACT)

    # Przeci_cie1 2 outline → Przeci_cie1 2 (cut)
    with BuildSketch(Plane(origin=(0, 0, 0), x_dir=(1, 0, 0), z_dir=(0, 1, 0)).offset(PRZECI_CIE1_START_2)):
        Circle(PRZECI_CIE1_2_OUTLINE_R)
    extrude(amount=PRZECI_CIE1_2_DEPTH, mode=Mode.SUBTRACT)


solid = part.part
